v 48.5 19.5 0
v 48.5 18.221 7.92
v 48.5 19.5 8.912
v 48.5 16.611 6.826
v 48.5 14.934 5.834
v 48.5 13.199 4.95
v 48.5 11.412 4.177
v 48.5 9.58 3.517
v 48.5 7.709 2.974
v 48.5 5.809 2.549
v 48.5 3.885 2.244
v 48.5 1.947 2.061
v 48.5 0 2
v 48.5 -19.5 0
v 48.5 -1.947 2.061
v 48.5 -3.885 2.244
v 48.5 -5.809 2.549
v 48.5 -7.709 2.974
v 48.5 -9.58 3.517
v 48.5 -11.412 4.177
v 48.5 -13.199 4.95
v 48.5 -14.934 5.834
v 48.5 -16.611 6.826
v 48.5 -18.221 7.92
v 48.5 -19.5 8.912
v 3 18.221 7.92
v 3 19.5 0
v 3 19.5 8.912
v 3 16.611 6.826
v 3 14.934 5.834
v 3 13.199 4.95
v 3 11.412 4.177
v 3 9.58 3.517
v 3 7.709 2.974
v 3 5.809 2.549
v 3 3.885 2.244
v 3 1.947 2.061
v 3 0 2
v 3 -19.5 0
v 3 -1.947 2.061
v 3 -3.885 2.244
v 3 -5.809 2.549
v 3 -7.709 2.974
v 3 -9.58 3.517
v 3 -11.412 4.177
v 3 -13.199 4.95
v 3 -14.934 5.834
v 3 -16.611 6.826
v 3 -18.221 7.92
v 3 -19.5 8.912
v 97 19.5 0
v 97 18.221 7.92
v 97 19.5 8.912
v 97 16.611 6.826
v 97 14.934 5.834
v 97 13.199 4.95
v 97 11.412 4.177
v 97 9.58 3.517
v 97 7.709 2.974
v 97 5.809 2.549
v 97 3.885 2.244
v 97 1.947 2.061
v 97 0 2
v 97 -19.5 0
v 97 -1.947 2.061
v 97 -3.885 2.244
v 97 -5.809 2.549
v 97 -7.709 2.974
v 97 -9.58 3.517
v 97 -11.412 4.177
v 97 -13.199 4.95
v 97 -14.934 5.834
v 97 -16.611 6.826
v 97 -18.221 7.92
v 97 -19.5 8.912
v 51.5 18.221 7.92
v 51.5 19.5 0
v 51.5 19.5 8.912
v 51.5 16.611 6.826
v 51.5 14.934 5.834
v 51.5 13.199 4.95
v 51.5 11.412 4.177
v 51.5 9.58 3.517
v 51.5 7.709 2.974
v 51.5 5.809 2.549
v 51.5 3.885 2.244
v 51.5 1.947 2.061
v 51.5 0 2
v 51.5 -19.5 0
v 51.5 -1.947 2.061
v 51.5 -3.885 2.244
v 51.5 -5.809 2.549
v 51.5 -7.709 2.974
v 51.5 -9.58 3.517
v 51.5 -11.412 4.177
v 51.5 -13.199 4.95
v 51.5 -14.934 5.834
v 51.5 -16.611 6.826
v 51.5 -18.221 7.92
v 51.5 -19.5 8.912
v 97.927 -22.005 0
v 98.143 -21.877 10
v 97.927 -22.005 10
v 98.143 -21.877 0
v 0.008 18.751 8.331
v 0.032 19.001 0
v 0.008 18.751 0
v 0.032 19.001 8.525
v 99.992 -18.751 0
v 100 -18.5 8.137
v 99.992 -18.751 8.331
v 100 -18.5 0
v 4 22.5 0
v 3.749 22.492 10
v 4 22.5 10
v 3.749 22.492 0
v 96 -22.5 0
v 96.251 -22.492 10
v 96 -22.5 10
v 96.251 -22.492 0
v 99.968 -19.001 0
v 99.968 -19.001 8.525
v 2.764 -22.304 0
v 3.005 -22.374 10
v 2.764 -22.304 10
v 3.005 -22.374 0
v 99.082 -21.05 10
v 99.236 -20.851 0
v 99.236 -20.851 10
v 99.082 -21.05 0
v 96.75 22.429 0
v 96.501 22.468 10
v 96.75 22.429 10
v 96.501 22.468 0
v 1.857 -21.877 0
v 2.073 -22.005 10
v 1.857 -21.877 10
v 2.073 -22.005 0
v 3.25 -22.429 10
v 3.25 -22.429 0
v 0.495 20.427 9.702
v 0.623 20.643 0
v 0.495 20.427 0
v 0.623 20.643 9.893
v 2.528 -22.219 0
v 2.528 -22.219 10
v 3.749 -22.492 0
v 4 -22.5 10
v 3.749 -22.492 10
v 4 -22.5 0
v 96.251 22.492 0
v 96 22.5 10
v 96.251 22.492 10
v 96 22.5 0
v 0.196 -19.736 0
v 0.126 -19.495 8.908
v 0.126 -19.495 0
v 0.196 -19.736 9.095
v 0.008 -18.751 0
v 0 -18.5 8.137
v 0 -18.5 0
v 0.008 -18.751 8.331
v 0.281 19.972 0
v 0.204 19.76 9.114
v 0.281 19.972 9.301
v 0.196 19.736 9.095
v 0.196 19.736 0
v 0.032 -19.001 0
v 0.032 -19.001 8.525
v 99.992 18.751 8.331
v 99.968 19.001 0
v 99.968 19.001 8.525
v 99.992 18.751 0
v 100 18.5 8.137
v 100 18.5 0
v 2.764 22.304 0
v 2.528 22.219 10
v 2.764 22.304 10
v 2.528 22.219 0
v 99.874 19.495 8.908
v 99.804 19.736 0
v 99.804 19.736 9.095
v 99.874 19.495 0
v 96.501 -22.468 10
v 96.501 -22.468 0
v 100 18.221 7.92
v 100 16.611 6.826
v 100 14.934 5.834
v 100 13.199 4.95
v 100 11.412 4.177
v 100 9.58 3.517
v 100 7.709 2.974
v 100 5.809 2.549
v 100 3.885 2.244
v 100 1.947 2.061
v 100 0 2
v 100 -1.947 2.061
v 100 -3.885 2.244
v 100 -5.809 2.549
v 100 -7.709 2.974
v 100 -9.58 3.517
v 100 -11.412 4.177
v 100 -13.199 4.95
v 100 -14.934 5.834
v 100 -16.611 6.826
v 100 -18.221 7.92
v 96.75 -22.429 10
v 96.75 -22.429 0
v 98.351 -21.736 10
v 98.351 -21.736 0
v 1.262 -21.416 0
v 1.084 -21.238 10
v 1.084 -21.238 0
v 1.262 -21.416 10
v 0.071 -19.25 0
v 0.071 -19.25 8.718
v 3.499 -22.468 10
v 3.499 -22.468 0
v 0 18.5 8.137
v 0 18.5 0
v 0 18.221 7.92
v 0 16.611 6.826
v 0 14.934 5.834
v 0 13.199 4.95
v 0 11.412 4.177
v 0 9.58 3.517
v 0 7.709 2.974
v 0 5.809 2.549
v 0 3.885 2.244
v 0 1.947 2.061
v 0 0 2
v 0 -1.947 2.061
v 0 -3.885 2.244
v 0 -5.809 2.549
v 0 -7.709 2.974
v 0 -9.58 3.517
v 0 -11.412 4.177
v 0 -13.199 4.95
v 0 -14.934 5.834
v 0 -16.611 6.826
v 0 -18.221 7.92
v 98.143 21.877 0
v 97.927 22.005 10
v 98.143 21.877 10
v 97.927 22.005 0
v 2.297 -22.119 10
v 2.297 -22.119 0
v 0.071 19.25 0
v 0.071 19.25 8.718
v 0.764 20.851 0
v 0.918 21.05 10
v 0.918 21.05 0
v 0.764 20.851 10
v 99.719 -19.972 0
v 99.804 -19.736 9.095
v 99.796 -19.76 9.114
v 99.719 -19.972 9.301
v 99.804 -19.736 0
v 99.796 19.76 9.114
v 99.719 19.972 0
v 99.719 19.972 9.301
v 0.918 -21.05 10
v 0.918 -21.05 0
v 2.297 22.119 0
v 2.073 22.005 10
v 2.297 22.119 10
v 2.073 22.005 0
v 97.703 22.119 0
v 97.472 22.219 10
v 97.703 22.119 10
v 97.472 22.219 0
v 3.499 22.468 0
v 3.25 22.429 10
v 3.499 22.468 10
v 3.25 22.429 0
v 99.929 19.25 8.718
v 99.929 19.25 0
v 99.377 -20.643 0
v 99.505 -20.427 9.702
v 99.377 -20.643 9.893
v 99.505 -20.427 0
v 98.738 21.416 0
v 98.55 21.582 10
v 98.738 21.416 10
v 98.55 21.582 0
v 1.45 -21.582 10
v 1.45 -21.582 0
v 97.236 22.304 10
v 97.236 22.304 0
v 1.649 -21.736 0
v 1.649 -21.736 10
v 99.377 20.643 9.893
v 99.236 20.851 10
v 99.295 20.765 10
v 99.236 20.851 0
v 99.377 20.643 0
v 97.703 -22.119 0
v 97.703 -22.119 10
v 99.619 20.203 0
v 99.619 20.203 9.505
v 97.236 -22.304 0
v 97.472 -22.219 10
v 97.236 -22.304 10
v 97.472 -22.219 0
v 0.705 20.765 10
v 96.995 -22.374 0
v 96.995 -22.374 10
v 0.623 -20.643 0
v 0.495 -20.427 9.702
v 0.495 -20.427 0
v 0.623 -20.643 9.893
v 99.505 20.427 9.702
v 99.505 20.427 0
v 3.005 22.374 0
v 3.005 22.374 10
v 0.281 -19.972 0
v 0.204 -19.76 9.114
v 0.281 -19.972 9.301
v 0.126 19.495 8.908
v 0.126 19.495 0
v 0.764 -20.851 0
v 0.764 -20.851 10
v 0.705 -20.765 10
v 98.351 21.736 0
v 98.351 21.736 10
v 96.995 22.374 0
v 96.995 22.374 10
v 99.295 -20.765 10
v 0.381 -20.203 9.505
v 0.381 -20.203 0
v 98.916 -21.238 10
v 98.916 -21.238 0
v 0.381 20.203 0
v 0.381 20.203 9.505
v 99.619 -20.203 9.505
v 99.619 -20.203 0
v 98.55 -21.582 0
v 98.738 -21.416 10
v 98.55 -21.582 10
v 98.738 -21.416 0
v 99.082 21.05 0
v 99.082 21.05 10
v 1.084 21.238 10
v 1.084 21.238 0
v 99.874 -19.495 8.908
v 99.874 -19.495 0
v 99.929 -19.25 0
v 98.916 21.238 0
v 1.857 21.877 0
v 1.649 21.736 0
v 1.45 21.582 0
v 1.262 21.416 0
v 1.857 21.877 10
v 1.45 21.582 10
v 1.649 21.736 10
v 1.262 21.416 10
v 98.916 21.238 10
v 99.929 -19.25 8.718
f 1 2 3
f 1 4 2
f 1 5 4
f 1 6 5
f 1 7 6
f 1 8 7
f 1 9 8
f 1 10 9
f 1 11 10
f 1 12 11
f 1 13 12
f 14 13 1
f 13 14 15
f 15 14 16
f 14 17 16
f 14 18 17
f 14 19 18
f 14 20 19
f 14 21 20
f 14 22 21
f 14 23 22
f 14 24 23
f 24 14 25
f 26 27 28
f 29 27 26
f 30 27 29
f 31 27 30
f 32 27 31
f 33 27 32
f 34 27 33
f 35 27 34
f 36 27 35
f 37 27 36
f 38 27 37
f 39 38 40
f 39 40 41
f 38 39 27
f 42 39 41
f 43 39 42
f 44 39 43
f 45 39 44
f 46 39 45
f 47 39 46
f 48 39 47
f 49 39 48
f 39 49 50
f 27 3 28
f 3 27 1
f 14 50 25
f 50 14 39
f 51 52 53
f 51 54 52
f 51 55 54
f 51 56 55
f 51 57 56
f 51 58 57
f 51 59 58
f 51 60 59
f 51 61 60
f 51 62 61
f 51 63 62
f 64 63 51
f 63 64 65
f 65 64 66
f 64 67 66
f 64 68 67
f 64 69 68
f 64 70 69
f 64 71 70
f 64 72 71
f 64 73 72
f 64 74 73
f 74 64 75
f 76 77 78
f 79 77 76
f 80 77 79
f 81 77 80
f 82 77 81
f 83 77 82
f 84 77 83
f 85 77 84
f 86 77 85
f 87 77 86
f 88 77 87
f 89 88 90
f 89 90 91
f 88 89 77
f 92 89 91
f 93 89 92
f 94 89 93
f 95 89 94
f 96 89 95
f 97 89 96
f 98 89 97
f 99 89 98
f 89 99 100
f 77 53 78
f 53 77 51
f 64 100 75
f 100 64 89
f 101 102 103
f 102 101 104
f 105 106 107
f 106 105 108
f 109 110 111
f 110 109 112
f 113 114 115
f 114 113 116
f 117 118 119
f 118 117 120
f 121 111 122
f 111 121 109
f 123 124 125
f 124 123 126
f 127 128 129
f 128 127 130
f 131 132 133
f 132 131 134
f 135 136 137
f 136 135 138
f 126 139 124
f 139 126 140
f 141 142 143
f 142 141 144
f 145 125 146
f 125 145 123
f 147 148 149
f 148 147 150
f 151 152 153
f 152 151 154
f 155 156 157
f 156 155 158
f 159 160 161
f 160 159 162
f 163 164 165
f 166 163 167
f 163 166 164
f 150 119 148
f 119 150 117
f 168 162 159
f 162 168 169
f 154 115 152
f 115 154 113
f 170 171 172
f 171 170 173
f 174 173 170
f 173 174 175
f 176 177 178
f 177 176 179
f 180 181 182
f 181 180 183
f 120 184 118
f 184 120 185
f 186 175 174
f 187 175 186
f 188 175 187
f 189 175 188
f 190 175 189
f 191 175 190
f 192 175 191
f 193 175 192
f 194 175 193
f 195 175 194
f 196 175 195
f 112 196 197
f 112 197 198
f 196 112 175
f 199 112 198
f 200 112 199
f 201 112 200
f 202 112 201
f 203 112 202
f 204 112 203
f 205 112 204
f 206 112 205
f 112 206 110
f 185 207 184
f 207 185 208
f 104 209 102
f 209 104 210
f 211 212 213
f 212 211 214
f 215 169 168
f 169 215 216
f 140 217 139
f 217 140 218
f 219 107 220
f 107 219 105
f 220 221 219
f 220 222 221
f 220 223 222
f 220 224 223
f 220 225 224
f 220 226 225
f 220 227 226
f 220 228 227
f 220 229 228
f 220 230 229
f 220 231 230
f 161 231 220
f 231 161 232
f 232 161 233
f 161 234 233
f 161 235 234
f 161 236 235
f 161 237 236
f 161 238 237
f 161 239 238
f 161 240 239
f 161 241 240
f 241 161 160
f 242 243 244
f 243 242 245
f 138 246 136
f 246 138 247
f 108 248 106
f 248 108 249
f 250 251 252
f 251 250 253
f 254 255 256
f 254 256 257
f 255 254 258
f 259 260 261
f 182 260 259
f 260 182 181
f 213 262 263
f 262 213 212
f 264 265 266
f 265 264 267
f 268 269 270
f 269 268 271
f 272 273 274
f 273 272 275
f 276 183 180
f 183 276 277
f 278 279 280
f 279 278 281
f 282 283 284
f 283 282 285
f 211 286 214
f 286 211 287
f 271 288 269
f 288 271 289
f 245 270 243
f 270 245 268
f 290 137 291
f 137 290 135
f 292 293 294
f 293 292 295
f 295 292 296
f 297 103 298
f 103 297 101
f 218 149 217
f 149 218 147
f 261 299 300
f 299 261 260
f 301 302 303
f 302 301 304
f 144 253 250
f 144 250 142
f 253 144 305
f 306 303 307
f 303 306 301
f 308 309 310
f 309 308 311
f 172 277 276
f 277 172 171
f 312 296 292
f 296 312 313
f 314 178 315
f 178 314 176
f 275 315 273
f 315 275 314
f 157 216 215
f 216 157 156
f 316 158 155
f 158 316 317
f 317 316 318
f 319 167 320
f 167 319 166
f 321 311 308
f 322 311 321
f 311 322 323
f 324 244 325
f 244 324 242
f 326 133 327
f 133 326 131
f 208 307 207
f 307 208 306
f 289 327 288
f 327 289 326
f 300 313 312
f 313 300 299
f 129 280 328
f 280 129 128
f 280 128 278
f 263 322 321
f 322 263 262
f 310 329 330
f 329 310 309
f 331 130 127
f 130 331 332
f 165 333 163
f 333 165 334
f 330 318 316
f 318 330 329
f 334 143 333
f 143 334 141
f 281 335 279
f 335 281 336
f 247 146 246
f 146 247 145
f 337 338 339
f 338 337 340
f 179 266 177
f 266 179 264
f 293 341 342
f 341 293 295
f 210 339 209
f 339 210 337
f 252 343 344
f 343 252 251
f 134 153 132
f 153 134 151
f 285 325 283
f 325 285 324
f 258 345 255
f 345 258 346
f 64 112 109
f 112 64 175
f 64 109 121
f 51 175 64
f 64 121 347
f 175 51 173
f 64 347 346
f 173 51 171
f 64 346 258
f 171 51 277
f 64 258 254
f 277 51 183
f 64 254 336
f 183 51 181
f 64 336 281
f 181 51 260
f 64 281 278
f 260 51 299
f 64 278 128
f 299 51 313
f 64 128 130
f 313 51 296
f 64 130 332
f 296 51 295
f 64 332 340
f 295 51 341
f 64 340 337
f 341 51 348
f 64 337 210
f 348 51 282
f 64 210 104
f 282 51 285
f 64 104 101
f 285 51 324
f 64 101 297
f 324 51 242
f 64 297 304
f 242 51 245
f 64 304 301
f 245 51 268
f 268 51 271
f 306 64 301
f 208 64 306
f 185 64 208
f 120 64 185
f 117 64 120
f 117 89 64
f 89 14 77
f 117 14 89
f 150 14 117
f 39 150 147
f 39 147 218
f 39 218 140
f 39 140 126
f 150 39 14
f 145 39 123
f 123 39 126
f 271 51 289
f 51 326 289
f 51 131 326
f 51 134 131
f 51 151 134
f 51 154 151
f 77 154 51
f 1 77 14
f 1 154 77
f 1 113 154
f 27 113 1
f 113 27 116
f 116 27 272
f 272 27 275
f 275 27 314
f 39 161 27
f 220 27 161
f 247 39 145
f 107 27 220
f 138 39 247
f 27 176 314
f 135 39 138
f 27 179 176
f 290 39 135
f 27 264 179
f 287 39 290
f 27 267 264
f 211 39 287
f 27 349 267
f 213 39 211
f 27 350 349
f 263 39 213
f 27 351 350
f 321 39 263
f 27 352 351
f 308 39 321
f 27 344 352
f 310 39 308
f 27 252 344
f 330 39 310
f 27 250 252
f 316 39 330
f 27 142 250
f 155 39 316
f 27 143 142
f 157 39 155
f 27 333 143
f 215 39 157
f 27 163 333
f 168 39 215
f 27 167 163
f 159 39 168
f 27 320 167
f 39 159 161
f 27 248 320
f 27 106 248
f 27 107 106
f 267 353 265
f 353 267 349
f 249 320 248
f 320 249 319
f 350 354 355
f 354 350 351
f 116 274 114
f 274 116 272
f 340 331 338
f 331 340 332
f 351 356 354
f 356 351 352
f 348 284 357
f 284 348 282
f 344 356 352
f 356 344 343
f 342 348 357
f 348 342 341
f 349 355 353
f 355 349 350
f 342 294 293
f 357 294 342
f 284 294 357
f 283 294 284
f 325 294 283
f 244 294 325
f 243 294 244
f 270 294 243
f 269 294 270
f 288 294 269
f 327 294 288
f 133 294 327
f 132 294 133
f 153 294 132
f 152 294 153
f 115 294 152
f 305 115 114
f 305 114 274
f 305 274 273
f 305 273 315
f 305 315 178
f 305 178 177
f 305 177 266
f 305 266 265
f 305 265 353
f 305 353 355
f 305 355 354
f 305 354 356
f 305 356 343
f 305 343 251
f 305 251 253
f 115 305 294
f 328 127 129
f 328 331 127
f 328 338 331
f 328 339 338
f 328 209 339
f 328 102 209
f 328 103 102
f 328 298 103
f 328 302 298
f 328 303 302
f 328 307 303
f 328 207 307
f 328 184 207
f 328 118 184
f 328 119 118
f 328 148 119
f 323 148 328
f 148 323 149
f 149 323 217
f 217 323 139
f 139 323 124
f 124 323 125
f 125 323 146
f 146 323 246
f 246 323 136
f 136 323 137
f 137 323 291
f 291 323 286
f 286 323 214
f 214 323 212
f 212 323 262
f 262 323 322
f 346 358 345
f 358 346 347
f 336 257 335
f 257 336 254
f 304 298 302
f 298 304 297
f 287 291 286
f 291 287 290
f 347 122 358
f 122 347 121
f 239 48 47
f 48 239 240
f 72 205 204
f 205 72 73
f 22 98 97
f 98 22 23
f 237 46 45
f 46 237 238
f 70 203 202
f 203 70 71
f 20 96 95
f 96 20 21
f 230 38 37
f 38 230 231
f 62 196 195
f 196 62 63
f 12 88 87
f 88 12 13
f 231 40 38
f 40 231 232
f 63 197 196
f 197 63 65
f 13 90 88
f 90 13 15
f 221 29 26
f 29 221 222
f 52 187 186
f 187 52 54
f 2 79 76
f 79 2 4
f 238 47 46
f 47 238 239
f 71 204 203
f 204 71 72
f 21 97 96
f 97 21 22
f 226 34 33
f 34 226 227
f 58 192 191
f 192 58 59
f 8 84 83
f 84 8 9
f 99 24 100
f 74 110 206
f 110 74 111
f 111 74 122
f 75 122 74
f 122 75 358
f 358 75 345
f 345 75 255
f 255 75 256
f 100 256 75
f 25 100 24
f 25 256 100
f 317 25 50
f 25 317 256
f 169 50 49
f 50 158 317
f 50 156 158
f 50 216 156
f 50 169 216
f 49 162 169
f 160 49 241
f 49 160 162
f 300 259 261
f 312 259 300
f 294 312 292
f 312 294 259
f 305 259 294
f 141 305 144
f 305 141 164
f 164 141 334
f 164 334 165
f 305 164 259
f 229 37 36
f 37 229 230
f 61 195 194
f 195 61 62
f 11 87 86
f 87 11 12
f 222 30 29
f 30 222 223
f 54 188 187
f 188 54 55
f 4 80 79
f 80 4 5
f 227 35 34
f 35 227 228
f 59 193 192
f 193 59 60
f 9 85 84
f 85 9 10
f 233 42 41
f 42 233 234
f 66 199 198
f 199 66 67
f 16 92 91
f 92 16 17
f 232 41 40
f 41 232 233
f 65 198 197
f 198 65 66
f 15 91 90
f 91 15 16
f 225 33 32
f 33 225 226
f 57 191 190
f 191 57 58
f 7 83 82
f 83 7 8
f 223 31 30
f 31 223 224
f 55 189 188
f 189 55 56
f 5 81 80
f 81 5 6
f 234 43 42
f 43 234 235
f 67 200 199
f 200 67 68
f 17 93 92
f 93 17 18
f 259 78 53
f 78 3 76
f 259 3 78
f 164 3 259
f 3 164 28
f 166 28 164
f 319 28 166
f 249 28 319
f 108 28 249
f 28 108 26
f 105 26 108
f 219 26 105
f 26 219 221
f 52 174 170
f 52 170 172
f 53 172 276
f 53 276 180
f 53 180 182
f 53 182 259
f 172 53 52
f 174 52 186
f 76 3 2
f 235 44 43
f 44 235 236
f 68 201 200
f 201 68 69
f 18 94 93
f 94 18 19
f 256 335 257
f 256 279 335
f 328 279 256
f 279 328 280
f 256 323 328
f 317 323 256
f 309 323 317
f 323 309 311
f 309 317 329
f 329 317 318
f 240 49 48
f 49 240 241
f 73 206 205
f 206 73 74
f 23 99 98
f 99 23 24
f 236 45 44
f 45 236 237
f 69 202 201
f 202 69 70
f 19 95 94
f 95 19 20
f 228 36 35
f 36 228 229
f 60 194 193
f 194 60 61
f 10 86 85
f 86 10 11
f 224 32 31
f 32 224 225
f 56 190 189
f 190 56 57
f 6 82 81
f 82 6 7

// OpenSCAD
// -----------------------------------------------------
// SodaStream-Patronen-Lager
//  ....damit eine leere, auf Austausch wartende Patrone
//      dann nicht doch irgendwann mal runterrollt und
//      die Fliesen zerdeppert.
//
//  Detlev Ahlgrimm, 07.2018
// -----------------------------------------------------

co2cylinder_diameter=60;  // [10:200]
diameter_backlash=2;      // [0:5]
width=45;                 // [10:200]
length=100;               // [10:200]
height=10;                // [5:50]
wall_strength=3;          // [1:10]
bottom_thickness=2;       // [1:10]
r=4;                      // [1:10]

$fn=100;

difference() {
  hull() {
    translate([       r, -width/2+r, 0]) cylinder(r=r, h=height);
    translate([length-r, -width/2+r, 0]) cylinder(r=r, h=height);
    translate([       r,  width/2-r, 0]) cylinder(r=r, h=height);
    translate([length-r,  width/2-r, 0]) cylinder(r=r, h=height);
  }
  translate([-1, 0, (co2cylinder_diameter+diameter_backlash)/2+bottom_thickness]) rotate([0, 90, 0]) cylinder(d=co2cylinder_diameter+diameter_backlash, h=length+2);

  for(x=[wall_strength, (length+wall_strength)/2]) {
    translate([x, -(width-2*wall_strength)/2, -1]) cube([(length-3*wall_strength)/2, width-2*wall_strength, height+2]);
  }
}
